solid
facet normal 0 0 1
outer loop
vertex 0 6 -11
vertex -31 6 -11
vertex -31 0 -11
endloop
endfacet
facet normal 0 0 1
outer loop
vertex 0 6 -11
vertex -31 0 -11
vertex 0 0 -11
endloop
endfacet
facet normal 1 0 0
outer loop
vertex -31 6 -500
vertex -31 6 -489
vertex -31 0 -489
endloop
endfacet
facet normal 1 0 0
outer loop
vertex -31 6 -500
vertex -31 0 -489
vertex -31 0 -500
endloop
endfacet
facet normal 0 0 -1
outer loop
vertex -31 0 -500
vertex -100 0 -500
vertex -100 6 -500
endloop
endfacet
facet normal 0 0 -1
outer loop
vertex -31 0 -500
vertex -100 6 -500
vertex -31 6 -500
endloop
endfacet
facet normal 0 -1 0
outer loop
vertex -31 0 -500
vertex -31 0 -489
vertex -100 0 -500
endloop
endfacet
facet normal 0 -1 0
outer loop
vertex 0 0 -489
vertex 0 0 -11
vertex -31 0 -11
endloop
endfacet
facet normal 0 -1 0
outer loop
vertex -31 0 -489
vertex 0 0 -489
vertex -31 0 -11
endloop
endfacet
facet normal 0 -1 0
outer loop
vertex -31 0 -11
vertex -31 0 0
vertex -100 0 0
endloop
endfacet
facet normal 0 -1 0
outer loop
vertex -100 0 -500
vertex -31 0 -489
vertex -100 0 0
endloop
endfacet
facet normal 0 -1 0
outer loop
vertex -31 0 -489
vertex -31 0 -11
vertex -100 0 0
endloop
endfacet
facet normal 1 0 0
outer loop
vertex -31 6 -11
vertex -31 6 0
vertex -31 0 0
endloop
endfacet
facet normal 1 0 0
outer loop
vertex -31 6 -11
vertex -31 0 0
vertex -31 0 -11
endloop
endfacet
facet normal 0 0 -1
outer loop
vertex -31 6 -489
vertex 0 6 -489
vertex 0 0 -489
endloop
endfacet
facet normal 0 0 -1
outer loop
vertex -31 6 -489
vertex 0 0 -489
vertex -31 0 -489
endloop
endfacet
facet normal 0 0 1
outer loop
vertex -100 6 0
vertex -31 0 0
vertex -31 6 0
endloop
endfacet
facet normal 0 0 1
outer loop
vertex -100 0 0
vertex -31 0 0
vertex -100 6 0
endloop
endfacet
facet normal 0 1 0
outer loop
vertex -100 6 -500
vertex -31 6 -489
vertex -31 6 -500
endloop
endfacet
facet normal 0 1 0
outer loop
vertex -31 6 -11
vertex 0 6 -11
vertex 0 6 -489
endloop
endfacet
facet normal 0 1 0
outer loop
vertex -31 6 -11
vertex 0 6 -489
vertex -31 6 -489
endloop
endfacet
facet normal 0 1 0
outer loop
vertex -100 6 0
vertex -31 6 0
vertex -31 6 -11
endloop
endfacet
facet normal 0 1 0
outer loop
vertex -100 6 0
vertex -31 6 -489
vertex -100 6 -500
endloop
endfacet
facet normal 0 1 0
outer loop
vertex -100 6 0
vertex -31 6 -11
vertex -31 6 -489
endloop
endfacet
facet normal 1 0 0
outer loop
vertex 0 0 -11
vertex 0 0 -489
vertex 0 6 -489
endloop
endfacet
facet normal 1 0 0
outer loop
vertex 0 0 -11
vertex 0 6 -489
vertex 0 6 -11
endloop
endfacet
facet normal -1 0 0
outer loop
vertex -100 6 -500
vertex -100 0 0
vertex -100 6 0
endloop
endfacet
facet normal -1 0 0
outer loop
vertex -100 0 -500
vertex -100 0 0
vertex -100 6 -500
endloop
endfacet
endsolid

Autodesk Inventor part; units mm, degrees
ref_plane "YZ Plane" through (0, 0, 0) normal (1, 0, 0) x (0, 1, 0)
ref_plane "XZ Plane" through (0, 0, 0) normal (0, 1, 0) x (-1, 0, 0)
sketch "Sketch1" plane through (0, 0, 0) normal (0, 1, 0) x (-1, 0, 0)
  line L0 (0, 0) -> (100, 0)
  line L1 (100, 0) -> (100, -500)
  line L2 (100, -500) -> (0, -500)
  line L3 (0, -500) -> (0, 0)
  dimension "d0" = 500
  dimension "d1" = 100
extrude "Extrusion1" add sketch "Sketch1" along normal blind 6
sketch "Sketch2" plane through (0, 6, 0) normal (0, 1, 0) x (1, 0, 0)
  circle A0 centre (-10, 5) radius 1.475
  line L0 (-100, 0) -> (0, 0) projected
  line L1 (0, 0) -> (0, 500) projected
  dimension "d4" = 2.95
  dimension "d5" = 5
  dimension "d6" = 10
extrude "Extrusion2" cut sketch "Sketch2" against normal blind 10
pattern_linear "Rectangular Pattern1" count 3 spacing 6 along (-1, 0, 0) of "Extrusion2"
ref_plane "Work Plane1" through (-100, 0, -250) normal (0, 0, 1) x (1, 0, 0)
sketch "Sketch3" plane through (0, 6, 0) normal (0, 1, 0) x (1, 0, 0)
  line L0 (-100, 0) -> (0, 0) projected
  line L1 (0, 0) -> (-31, 0)
  line L2 (-31, 0) -> (-31, 11)
  line L3 (-31, 11) -> (0, 11)
  line L4 (0, 11) -> (0, 0)
  dimension "d12" = 11
  dimension "d13" = 31
extrude "Extrusion3" cut sketch "Sketch3" against normal blind 10
mirror "Mirror1" about plane through (-100, 0, -250) normal (0, 0, 1) of "Extrusion2", "Rectangular Pattern1", "Extrusion3"
sketch "Sketch4" plane through (0, 6, 0) normal (0, 1, 0) x (1, 0, 0)
  line L0 (0, 489) -> (-31, 489) projected
  line L1 (-31, 489) -> (-31, 500) projected
  line L2 (-31, 500) -> (-100, 500) projected
  line L3 (-100, 500) -> (-100, 0) projected
  line L4 (-100, 0) -> (-31, 0) projected
  line L5 (-31, 0) -> (-31, 11) projected
  line L6 (-31, 11) -> (0, 11) projected
  line L7 (0, 11) -> (0, 489) projected
  point P0 (0, 0)
properties part number "Bending_plate_p2"
